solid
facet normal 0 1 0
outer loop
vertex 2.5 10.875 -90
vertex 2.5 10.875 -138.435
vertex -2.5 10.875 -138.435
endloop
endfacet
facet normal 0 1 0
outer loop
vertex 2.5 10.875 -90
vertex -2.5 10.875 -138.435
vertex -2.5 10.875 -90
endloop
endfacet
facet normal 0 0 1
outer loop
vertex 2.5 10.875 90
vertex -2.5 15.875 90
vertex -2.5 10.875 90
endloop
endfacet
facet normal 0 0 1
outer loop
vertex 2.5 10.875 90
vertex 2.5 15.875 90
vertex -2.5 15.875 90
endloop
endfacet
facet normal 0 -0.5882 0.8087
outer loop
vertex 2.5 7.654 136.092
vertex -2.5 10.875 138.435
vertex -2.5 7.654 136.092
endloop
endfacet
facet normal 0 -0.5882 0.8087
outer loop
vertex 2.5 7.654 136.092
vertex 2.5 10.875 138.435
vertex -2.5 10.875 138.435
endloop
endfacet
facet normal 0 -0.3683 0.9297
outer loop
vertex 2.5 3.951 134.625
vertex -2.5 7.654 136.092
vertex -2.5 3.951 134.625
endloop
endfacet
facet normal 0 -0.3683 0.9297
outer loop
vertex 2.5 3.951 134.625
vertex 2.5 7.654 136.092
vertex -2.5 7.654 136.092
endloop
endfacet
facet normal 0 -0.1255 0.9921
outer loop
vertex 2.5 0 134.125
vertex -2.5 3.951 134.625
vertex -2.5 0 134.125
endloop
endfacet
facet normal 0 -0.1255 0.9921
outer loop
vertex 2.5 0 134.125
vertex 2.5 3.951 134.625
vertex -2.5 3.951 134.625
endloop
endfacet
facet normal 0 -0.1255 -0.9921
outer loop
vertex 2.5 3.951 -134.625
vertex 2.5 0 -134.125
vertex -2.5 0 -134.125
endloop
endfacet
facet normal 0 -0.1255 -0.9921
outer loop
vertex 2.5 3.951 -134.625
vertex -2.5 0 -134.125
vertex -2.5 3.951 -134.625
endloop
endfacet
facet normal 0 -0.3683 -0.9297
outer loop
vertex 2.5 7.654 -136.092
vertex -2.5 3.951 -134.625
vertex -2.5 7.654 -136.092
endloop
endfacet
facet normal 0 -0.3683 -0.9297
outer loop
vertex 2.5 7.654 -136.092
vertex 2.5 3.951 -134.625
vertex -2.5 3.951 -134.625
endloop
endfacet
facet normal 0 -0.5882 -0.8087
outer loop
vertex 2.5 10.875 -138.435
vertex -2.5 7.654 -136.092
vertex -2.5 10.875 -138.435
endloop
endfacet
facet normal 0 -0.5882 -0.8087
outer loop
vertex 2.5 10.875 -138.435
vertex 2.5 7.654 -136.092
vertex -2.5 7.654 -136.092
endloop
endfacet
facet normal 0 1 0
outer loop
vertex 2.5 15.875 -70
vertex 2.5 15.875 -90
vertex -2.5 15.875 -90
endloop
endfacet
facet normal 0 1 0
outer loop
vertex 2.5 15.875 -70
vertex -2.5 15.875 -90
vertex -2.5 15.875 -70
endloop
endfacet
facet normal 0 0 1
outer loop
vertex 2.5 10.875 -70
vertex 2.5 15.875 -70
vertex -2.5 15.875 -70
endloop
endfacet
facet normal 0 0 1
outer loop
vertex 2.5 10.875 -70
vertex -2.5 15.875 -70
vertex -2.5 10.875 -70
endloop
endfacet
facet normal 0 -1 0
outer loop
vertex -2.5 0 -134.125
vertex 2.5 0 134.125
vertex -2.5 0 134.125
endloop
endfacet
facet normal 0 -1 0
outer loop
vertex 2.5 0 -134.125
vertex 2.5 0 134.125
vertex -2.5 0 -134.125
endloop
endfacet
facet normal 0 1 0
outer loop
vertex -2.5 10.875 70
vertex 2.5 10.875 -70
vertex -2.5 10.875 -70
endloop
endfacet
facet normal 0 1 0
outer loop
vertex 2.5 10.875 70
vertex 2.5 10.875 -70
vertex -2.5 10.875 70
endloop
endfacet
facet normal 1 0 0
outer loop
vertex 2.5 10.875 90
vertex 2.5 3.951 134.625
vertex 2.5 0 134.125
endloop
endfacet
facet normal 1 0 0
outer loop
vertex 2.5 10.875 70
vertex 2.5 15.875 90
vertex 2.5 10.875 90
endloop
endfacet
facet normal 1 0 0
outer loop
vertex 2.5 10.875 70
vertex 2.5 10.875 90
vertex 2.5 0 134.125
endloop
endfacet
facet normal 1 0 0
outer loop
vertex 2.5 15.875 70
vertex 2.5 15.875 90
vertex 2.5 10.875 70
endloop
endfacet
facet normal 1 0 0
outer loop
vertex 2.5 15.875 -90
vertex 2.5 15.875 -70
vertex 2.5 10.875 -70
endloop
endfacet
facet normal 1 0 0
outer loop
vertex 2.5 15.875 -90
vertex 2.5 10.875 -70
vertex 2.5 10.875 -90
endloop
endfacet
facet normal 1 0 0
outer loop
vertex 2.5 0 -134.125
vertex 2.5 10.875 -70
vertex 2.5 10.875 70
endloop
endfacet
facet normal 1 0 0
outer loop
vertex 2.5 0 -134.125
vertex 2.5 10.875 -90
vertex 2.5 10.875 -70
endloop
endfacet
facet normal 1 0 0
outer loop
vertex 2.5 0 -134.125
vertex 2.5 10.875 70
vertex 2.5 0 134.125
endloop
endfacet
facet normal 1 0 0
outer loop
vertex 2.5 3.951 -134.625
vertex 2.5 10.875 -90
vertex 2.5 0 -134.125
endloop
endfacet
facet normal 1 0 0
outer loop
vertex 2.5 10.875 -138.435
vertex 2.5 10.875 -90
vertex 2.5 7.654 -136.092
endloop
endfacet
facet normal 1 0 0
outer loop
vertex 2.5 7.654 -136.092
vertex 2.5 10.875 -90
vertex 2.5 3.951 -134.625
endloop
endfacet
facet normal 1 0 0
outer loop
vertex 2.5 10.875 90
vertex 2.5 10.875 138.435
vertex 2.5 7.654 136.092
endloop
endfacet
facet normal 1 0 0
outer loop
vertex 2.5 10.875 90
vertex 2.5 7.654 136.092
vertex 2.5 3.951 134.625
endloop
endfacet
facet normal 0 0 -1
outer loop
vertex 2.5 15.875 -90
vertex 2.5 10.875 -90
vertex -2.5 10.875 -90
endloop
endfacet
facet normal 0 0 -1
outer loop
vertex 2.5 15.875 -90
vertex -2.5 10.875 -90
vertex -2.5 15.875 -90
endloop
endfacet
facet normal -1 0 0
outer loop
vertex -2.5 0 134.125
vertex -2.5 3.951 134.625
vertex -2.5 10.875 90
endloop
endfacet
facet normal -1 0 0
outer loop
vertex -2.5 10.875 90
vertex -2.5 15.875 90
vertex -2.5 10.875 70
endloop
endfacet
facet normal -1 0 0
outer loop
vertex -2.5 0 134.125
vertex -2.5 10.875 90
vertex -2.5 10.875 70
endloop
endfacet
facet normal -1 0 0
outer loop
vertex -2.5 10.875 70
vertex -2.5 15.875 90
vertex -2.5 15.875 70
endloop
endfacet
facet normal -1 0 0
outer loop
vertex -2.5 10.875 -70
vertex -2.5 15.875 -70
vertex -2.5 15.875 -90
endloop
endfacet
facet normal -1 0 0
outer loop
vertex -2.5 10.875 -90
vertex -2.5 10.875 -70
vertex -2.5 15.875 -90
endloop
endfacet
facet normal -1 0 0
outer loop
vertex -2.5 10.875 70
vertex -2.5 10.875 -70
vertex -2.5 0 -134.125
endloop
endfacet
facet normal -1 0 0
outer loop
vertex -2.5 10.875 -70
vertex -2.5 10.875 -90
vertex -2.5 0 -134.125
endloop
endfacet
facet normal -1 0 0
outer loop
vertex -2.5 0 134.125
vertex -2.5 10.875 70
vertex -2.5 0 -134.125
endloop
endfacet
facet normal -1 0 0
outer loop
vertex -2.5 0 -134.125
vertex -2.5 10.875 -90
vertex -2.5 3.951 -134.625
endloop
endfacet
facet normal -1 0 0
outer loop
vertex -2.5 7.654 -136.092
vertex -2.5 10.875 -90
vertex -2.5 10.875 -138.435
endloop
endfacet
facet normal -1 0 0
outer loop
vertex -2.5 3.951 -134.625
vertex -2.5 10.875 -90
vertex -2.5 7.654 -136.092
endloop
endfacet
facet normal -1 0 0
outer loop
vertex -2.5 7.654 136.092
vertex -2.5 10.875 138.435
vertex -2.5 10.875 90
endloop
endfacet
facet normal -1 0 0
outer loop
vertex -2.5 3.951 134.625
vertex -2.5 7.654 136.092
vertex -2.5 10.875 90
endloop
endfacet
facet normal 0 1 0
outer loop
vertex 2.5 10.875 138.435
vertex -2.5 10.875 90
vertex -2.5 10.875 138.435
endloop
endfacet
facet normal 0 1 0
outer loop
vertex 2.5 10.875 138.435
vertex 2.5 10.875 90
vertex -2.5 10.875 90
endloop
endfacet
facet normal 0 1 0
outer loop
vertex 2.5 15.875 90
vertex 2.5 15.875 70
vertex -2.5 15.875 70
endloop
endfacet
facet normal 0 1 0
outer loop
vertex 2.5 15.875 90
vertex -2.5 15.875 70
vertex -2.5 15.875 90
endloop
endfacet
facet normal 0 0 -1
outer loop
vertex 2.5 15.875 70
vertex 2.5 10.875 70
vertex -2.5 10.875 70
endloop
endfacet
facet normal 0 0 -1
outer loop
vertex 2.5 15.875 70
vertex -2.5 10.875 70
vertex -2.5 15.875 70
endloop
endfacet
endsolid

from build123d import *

# Parameters (mm, degrees)
BOSS_EXTRUDE1_DEPTH = 2.5


with BuildPart() as part:
    # Sketch1 → Boss-Extrude1 (new, symmetric)
    with BuildSketch(Plane(origin=(0, 0, 0), x_dir=(0, 0, -1), z_dir=(1, 0, 0))):
        with BuildLine():
            ThreePointArc((-138.434966494, 10.875), (-135.24177294, 5.848962219), (-134.125, 0))
            Line((-134.125, 0), (134.125, 0))
            ThreePointArc((134.125, 0), (135.24177294, 5.848962219), (138.434966494, 10.875))
            Line((138.434966494, 10.875), (90, 10.875))
            Line((90, 10.875), (90, 15.875))
            Line((90, 15.875), (70, 15.875))
            Line((70, 15.875), (70, 10.875))
            Line((70, 10.875), (-70, 10.875))
            Line((-70, 10.875), (-70, 15.875))
            Line((-70, 15.875), (-90, 15.875))
            Line((-90, 15.875), (-90, 10.875))
            Line((-90, 10.875), (-138.434966494, 10.875))
        make_face()
    extrude(amount=BOSS_EXTRUDE1_DEPTH, both=True)


solid = part.part
